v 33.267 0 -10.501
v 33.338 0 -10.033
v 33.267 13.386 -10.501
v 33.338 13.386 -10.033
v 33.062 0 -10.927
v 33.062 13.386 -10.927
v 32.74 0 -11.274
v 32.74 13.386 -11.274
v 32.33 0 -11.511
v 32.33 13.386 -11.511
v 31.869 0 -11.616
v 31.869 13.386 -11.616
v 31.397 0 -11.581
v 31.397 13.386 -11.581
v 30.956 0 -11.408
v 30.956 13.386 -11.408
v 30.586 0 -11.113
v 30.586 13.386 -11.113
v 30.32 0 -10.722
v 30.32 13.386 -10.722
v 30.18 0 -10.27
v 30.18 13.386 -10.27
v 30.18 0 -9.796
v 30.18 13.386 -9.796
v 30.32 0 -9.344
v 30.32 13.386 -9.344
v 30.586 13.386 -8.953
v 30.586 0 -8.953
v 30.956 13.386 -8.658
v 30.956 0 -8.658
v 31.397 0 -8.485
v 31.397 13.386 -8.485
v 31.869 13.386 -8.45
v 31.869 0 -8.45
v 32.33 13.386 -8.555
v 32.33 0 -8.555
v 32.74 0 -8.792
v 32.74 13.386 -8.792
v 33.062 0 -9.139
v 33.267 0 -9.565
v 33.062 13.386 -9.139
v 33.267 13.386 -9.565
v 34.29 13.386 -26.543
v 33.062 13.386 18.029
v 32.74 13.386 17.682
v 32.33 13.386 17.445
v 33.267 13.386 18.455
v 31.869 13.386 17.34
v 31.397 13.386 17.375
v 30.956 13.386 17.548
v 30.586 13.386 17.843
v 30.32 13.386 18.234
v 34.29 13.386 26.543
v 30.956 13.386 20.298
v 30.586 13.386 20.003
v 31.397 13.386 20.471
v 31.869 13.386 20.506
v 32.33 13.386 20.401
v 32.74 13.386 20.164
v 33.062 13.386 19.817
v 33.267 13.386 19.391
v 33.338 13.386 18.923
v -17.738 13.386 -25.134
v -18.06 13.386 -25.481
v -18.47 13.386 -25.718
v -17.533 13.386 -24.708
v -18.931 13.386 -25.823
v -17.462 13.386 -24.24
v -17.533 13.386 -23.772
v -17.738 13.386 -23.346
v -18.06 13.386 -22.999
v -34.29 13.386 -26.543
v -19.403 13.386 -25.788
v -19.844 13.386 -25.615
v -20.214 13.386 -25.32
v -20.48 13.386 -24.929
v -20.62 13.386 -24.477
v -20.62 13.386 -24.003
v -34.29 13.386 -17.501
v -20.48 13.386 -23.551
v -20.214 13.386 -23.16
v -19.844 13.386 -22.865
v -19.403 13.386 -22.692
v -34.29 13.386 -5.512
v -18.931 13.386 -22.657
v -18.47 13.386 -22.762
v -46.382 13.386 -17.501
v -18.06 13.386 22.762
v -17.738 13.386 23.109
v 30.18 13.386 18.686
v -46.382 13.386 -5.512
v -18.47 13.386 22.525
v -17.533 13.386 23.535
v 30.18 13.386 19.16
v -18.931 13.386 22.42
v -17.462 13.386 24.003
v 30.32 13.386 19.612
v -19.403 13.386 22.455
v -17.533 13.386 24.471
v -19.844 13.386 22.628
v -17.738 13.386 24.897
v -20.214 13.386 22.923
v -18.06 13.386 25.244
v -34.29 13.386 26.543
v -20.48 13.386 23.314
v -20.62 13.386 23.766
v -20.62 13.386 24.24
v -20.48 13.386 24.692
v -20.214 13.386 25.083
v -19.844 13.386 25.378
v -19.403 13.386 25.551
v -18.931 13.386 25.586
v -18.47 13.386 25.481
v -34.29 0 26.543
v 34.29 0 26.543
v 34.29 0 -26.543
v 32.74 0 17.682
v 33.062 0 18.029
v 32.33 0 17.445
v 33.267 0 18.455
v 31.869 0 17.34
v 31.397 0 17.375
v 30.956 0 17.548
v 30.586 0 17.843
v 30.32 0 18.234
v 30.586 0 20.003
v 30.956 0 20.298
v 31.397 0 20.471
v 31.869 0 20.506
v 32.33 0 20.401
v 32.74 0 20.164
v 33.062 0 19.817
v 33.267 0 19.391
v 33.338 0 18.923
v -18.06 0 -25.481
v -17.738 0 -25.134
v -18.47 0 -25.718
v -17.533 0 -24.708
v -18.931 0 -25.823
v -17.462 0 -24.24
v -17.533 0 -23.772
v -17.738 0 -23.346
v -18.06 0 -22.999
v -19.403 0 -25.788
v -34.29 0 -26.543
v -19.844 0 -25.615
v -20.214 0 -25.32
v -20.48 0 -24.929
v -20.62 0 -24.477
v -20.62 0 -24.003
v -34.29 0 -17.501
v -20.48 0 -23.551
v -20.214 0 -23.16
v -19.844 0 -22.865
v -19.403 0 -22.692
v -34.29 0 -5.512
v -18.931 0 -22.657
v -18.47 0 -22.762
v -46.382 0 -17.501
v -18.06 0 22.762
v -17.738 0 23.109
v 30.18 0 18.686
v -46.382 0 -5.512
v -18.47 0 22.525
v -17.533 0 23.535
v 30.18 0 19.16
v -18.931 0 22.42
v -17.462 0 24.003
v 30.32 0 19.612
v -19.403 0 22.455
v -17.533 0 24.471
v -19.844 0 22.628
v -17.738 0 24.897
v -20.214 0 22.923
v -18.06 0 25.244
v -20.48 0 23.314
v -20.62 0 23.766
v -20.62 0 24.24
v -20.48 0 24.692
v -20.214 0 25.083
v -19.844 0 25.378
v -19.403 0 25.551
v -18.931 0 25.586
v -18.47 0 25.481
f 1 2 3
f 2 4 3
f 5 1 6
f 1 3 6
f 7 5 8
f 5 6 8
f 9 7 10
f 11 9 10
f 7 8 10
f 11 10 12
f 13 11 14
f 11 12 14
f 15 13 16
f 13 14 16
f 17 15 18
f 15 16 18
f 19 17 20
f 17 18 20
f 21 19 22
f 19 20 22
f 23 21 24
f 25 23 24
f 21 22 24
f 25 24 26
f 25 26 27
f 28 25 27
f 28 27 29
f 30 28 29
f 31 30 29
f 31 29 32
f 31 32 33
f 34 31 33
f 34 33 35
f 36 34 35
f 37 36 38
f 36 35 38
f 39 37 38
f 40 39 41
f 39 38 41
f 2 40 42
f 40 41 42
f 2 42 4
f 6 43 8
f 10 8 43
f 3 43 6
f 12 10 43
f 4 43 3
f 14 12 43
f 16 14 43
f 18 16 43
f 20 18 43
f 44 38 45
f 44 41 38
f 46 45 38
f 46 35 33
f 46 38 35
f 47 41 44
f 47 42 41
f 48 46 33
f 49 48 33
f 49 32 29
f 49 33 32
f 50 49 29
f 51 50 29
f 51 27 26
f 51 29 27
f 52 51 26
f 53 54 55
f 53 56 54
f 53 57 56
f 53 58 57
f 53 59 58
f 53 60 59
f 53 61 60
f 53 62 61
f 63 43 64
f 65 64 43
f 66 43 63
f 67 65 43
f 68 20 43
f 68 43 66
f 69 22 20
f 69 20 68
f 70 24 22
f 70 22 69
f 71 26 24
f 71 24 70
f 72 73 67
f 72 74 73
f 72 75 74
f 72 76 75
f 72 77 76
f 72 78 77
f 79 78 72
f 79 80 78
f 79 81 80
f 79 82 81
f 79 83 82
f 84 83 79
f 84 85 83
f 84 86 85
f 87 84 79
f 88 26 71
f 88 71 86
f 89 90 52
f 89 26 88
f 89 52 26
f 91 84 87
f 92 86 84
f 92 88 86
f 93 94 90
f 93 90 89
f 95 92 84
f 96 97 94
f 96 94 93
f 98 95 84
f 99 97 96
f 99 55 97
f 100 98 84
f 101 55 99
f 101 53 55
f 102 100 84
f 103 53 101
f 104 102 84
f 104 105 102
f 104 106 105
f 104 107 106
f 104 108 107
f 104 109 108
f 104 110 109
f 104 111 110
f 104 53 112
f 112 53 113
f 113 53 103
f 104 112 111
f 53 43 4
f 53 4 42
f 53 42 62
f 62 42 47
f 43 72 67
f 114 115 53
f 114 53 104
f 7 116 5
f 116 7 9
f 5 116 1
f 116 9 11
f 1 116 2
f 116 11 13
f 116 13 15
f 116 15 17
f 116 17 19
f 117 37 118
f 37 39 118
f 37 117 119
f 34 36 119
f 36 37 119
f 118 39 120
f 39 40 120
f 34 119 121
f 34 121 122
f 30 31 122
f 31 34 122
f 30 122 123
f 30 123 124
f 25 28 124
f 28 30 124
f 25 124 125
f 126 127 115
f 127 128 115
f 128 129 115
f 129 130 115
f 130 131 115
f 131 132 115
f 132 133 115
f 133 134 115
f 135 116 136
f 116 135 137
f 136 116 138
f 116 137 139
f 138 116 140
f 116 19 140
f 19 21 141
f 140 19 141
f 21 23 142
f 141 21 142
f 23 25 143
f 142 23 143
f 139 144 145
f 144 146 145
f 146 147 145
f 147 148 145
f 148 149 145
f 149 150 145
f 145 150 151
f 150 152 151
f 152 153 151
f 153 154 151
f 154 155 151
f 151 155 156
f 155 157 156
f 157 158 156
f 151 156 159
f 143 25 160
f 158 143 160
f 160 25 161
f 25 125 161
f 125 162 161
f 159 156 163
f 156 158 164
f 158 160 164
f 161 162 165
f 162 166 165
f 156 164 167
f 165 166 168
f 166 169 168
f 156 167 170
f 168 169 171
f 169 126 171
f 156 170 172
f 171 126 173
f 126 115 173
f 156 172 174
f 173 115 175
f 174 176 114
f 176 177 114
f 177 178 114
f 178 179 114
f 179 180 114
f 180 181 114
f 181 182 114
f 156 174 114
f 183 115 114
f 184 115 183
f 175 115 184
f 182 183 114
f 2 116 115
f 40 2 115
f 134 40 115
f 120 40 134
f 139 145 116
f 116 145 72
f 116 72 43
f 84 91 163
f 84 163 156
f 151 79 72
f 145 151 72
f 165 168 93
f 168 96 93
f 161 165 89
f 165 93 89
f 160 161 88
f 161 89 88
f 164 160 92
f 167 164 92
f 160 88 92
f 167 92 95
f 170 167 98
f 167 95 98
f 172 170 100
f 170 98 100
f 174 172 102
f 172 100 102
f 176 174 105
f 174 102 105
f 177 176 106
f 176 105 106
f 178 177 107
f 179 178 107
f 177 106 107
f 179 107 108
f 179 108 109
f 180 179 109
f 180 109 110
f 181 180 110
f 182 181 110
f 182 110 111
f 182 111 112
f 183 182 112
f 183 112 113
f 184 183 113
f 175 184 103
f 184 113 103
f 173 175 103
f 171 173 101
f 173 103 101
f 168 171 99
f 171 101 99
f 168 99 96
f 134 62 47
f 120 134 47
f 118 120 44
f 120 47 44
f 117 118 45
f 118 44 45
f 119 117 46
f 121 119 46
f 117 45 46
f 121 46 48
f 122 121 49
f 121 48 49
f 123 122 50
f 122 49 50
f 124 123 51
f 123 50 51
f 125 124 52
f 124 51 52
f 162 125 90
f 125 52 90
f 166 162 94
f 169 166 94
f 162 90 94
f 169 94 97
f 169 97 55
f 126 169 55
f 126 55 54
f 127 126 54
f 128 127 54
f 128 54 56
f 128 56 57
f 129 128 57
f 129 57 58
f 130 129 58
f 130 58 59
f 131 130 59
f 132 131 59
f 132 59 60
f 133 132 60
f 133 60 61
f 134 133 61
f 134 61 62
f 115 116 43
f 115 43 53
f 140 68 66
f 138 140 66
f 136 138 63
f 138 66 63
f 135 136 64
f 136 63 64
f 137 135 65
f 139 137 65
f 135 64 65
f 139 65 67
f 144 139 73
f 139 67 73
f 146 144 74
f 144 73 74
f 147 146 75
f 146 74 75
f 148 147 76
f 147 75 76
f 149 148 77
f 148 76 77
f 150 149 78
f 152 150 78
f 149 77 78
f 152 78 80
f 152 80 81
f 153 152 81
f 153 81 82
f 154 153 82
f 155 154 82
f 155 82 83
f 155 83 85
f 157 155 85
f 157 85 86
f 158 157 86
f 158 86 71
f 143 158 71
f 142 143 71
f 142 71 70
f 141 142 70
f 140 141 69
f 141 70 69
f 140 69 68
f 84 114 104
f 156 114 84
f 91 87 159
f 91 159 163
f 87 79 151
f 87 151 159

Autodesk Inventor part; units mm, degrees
ref_plane "YZ Plane" through (0, 0, 0) normal (1, 0, 0) x (0, 1, 0)
ref_plane "XZ Plane" through (0, 0, 0) normal (0, 1, 0) x (-1, 0, 0)
ref_plane "XY Plane" through (0, 0, 0) normal (0, 0, 1) x (1, 0, 0)
sketch "Sketch1" plane through (0, 0, 0) normal (0, 1, 0) x (-1, 0, 0)
  line L0 (34.29, -26.543) -> (-34.29, -26.543)
  line L1 (-34.29, -26.543) -> (-34.29, 26.543)
  line L2 (-34.29, 26.543) -> (34.29, 26.543)
  line L3 (34.29, 26.543) -> (34.29, -26.543)
  line L4 (34.29, -17.5006) -> (46.3824, -17.5006)
  line L5 (46.3824, -17.5006) -> (46.3824, -5.5118)
  line L6 (46.3824, -5.5118) -> (34.29, -5.5118)
  line L7 (34.29, -5.5118) -> (34.29, -17.5006)
  point P0 (0, 0)
  point P1 (0, -26.543)
  point P2 (34.29, 0)
  dimension "d0" = 68.58
  dimension "d1" = 53.086
  dimension "d2" = 9.0424
  dimension "d3" = 11.9888
extrude "Extrusion1" add sketch "Sketch1" along normal blind 13.3858
sketch "Sketch2" plane through (0, 13.3858, 0) normal (0, 1, 0) x (1, 0, 0)
  circle A0 centre (-19.05, 24.2401) radius 1.5875
  circle A1 centre (31.75, 10.033) radius 1.5875
  circle A2 centre (31.75, -18.923) radius 1.5875
  circle A3 centre (-19.05, -24.003) radius 1.5875
  line L0 (-34.29, 26.543) -> (-34.29, 17.5006) projected
  line L1 (34.29, -26.543) -> (34.29, 26.543) projected
  line L2 (34.29, 26.543) -> (-34.29, 26.543) projected
  line L3 (-34.29, -26.543) -> (34.29, -26.543) projected
  point P0 (0, 0)
  dimension "d6" = 15.24
  dimension "d7" = 3.175
  dimension "d9" = 16.51
  dimension "d10" = 7.62
  dimension "d11" = 2.54
  dimension "d12" = 50.8
extrude "Extrusion2" cut sketch "Sketch2" against normal blind 13.3858
properties part number "Arduino"
